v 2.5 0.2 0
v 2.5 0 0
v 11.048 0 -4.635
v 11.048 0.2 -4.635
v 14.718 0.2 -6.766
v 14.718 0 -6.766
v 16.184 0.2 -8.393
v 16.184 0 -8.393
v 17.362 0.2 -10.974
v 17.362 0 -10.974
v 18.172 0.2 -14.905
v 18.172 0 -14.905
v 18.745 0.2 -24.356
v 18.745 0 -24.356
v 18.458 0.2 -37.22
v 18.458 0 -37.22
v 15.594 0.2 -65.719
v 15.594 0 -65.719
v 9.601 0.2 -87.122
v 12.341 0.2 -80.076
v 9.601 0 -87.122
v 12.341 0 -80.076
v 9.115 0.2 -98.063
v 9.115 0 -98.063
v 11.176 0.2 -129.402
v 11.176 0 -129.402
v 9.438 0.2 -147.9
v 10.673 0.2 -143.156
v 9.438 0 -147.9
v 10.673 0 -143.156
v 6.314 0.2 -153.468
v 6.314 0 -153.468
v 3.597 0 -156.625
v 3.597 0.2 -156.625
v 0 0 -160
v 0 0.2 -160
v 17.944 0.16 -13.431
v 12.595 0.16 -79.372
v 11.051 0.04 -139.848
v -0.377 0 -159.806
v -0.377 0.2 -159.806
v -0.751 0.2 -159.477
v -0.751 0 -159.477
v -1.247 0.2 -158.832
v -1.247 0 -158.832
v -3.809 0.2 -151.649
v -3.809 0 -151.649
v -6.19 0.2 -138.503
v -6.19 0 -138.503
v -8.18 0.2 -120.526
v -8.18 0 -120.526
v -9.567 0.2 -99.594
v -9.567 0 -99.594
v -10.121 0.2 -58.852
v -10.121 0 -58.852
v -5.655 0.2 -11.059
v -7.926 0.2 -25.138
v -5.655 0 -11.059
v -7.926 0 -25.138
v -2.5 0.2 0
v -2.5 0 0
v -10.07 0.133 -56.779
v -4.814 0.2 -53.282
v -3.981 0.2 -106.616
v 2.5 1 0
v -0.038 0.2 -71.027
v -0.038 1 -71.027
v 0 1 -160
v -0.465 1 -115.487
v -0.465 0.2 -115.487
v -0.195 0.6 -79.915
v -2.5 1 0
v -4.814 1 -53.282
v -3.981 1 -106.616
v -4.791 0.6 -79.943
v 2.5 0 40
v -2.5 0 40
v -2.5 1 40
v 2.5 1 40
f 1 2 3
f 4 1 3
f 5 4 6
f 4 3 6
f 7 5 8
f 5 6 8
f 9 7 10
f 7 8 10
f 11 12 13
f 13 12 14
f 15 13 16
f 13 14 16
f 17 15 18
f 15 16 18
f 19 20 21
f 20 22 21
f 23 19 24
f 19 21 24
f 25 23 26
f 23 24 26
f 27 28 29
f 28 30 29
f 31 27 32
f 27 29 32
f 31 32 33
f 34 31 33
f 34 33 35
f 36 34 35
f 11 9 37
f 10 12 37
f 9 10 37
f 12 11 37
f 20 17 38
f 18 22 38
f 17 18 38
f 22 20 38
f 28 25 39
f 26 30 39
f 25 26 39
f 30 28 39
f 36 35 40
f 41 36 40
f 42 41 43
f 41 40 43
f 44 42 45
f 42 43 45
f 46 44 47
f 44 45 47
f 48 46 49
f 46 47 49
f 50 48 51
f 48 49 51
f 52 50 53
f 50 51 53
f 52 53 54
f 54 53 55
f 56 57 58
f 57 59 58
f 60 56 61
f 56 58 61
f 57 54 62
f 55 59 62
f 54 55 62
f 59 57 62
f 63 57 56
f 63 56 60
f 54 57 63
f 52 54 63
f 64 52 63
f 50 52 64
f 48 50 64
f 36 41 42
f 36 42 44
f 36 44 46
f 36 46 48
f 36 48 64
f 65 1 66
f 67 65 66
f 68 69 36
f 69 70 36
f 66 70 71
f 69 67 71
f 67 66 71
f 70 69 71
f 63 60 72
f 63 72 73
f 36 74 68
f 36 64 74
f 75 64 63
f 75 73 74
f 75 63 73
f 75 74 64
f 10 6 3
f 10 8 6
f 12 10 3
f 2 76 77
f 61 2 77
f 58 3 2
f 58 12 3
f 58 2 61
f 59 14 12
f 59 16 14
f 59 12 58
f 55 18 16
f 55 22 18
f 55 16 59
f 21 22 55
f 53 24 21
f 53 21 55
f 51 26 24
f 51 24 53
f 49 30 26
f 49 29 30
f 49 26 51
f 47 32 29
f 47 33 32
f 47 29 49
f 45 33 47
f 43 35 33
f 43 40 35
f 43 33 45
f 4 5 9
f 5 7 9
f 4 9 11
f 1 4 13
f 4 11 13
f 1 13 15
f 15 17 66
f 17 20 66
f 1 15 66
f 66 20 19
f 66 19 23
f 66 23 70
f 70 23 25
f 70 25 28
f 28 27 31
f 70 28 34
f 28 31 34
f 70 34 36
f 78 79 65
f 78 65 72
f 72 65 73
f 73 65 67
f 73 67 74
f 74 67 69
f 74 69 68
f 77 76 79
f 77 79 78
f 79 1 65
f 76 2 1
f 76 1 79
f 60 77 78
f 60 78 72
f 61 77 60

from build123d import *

# Parameters (mm, degrees)
BOSS_EXTRUDE1_DEPTH = 1
BOSS_EXTRUDE2_DEPTH = 0.2


with BuildPart() as part:
    # Sketch2 → Boss-Extrude1 (new body)
    with BuildSketch(Plane(origin=(0, 0, 0), x_dir=(1, 0, 0), z_dir=(0, 1, 0))):
        with BuildLine():
            add(Edge.make_bspline(
                [(-2.5, 0), (-8.331510312, 79.88522278), (0, 160)],
                knots=[0, 0, 0, 1, 1, 1], degree=2))
            Line((-2.5, 0), (-2.5, -40))
            Line((-2.5, -40), (2.5, -40))
            Line((2.5, -40), (2.5, 0))
            add(Edge.make_bspline(
                [(2.5, 0), (-1.639184348, 79.830180153), (0, 160)],
                knots=[0, 0, 0, 1, 1, 1], degree=2))
        make_face()
    extrude(amount=BOSS_EXTRUDE1_DEPTH)

    # Sketch2<4> → Boss-Extrude2 (add)
    with BuildSketch(Plane(origin=(0, 0, 0), x_dir=(1, 0, 0), z_dir=(0, 1, 0))):
        with BuildLine():
            add(Edge.make_bspline(
                [(0, 160), (-8.98258689, 157.028093124), (-16.499984948, 35.906479253), (-2.5, 0)],
                knots=[0, 0, 0, 0, 1, 1, 1, 1], degree=3))
            add(Edge.make_bspline(
                [(-2.5, 0), (-8.331510312, 79.88522278), (0, 160)],
                knots=[0, 0, 0, 1, 1, 1], degree=2))
        make_face()
        with BuildLine():
            add(Edge.make_bspline(
                [(2.5, 0), (12.171354382, 6.467777283), (22.699450058, 1.261618492), (16.020181883, 76.776452349), (5.943994757, 89.557886893), (14.633418631, 135.720154628), (8.585224938, 152.595946761), (0, 160)],
                knots=[0, 0, 0, 0, 0.195491686, 0.494280015, 0.568689677, 0.865178642, 1, 1, 1, 1], degree=3))
            add(Edge.make_bspline(
                [(2.5, 0), (-1.639184348, 79.830180153), (0, 160)],
                knots=[0, 0, 0, 1, 1, 1], degree=2))
        make_face()
    extrude(amount=BOSS_EXTRUDE2_DEPTH)


solid = part.part
